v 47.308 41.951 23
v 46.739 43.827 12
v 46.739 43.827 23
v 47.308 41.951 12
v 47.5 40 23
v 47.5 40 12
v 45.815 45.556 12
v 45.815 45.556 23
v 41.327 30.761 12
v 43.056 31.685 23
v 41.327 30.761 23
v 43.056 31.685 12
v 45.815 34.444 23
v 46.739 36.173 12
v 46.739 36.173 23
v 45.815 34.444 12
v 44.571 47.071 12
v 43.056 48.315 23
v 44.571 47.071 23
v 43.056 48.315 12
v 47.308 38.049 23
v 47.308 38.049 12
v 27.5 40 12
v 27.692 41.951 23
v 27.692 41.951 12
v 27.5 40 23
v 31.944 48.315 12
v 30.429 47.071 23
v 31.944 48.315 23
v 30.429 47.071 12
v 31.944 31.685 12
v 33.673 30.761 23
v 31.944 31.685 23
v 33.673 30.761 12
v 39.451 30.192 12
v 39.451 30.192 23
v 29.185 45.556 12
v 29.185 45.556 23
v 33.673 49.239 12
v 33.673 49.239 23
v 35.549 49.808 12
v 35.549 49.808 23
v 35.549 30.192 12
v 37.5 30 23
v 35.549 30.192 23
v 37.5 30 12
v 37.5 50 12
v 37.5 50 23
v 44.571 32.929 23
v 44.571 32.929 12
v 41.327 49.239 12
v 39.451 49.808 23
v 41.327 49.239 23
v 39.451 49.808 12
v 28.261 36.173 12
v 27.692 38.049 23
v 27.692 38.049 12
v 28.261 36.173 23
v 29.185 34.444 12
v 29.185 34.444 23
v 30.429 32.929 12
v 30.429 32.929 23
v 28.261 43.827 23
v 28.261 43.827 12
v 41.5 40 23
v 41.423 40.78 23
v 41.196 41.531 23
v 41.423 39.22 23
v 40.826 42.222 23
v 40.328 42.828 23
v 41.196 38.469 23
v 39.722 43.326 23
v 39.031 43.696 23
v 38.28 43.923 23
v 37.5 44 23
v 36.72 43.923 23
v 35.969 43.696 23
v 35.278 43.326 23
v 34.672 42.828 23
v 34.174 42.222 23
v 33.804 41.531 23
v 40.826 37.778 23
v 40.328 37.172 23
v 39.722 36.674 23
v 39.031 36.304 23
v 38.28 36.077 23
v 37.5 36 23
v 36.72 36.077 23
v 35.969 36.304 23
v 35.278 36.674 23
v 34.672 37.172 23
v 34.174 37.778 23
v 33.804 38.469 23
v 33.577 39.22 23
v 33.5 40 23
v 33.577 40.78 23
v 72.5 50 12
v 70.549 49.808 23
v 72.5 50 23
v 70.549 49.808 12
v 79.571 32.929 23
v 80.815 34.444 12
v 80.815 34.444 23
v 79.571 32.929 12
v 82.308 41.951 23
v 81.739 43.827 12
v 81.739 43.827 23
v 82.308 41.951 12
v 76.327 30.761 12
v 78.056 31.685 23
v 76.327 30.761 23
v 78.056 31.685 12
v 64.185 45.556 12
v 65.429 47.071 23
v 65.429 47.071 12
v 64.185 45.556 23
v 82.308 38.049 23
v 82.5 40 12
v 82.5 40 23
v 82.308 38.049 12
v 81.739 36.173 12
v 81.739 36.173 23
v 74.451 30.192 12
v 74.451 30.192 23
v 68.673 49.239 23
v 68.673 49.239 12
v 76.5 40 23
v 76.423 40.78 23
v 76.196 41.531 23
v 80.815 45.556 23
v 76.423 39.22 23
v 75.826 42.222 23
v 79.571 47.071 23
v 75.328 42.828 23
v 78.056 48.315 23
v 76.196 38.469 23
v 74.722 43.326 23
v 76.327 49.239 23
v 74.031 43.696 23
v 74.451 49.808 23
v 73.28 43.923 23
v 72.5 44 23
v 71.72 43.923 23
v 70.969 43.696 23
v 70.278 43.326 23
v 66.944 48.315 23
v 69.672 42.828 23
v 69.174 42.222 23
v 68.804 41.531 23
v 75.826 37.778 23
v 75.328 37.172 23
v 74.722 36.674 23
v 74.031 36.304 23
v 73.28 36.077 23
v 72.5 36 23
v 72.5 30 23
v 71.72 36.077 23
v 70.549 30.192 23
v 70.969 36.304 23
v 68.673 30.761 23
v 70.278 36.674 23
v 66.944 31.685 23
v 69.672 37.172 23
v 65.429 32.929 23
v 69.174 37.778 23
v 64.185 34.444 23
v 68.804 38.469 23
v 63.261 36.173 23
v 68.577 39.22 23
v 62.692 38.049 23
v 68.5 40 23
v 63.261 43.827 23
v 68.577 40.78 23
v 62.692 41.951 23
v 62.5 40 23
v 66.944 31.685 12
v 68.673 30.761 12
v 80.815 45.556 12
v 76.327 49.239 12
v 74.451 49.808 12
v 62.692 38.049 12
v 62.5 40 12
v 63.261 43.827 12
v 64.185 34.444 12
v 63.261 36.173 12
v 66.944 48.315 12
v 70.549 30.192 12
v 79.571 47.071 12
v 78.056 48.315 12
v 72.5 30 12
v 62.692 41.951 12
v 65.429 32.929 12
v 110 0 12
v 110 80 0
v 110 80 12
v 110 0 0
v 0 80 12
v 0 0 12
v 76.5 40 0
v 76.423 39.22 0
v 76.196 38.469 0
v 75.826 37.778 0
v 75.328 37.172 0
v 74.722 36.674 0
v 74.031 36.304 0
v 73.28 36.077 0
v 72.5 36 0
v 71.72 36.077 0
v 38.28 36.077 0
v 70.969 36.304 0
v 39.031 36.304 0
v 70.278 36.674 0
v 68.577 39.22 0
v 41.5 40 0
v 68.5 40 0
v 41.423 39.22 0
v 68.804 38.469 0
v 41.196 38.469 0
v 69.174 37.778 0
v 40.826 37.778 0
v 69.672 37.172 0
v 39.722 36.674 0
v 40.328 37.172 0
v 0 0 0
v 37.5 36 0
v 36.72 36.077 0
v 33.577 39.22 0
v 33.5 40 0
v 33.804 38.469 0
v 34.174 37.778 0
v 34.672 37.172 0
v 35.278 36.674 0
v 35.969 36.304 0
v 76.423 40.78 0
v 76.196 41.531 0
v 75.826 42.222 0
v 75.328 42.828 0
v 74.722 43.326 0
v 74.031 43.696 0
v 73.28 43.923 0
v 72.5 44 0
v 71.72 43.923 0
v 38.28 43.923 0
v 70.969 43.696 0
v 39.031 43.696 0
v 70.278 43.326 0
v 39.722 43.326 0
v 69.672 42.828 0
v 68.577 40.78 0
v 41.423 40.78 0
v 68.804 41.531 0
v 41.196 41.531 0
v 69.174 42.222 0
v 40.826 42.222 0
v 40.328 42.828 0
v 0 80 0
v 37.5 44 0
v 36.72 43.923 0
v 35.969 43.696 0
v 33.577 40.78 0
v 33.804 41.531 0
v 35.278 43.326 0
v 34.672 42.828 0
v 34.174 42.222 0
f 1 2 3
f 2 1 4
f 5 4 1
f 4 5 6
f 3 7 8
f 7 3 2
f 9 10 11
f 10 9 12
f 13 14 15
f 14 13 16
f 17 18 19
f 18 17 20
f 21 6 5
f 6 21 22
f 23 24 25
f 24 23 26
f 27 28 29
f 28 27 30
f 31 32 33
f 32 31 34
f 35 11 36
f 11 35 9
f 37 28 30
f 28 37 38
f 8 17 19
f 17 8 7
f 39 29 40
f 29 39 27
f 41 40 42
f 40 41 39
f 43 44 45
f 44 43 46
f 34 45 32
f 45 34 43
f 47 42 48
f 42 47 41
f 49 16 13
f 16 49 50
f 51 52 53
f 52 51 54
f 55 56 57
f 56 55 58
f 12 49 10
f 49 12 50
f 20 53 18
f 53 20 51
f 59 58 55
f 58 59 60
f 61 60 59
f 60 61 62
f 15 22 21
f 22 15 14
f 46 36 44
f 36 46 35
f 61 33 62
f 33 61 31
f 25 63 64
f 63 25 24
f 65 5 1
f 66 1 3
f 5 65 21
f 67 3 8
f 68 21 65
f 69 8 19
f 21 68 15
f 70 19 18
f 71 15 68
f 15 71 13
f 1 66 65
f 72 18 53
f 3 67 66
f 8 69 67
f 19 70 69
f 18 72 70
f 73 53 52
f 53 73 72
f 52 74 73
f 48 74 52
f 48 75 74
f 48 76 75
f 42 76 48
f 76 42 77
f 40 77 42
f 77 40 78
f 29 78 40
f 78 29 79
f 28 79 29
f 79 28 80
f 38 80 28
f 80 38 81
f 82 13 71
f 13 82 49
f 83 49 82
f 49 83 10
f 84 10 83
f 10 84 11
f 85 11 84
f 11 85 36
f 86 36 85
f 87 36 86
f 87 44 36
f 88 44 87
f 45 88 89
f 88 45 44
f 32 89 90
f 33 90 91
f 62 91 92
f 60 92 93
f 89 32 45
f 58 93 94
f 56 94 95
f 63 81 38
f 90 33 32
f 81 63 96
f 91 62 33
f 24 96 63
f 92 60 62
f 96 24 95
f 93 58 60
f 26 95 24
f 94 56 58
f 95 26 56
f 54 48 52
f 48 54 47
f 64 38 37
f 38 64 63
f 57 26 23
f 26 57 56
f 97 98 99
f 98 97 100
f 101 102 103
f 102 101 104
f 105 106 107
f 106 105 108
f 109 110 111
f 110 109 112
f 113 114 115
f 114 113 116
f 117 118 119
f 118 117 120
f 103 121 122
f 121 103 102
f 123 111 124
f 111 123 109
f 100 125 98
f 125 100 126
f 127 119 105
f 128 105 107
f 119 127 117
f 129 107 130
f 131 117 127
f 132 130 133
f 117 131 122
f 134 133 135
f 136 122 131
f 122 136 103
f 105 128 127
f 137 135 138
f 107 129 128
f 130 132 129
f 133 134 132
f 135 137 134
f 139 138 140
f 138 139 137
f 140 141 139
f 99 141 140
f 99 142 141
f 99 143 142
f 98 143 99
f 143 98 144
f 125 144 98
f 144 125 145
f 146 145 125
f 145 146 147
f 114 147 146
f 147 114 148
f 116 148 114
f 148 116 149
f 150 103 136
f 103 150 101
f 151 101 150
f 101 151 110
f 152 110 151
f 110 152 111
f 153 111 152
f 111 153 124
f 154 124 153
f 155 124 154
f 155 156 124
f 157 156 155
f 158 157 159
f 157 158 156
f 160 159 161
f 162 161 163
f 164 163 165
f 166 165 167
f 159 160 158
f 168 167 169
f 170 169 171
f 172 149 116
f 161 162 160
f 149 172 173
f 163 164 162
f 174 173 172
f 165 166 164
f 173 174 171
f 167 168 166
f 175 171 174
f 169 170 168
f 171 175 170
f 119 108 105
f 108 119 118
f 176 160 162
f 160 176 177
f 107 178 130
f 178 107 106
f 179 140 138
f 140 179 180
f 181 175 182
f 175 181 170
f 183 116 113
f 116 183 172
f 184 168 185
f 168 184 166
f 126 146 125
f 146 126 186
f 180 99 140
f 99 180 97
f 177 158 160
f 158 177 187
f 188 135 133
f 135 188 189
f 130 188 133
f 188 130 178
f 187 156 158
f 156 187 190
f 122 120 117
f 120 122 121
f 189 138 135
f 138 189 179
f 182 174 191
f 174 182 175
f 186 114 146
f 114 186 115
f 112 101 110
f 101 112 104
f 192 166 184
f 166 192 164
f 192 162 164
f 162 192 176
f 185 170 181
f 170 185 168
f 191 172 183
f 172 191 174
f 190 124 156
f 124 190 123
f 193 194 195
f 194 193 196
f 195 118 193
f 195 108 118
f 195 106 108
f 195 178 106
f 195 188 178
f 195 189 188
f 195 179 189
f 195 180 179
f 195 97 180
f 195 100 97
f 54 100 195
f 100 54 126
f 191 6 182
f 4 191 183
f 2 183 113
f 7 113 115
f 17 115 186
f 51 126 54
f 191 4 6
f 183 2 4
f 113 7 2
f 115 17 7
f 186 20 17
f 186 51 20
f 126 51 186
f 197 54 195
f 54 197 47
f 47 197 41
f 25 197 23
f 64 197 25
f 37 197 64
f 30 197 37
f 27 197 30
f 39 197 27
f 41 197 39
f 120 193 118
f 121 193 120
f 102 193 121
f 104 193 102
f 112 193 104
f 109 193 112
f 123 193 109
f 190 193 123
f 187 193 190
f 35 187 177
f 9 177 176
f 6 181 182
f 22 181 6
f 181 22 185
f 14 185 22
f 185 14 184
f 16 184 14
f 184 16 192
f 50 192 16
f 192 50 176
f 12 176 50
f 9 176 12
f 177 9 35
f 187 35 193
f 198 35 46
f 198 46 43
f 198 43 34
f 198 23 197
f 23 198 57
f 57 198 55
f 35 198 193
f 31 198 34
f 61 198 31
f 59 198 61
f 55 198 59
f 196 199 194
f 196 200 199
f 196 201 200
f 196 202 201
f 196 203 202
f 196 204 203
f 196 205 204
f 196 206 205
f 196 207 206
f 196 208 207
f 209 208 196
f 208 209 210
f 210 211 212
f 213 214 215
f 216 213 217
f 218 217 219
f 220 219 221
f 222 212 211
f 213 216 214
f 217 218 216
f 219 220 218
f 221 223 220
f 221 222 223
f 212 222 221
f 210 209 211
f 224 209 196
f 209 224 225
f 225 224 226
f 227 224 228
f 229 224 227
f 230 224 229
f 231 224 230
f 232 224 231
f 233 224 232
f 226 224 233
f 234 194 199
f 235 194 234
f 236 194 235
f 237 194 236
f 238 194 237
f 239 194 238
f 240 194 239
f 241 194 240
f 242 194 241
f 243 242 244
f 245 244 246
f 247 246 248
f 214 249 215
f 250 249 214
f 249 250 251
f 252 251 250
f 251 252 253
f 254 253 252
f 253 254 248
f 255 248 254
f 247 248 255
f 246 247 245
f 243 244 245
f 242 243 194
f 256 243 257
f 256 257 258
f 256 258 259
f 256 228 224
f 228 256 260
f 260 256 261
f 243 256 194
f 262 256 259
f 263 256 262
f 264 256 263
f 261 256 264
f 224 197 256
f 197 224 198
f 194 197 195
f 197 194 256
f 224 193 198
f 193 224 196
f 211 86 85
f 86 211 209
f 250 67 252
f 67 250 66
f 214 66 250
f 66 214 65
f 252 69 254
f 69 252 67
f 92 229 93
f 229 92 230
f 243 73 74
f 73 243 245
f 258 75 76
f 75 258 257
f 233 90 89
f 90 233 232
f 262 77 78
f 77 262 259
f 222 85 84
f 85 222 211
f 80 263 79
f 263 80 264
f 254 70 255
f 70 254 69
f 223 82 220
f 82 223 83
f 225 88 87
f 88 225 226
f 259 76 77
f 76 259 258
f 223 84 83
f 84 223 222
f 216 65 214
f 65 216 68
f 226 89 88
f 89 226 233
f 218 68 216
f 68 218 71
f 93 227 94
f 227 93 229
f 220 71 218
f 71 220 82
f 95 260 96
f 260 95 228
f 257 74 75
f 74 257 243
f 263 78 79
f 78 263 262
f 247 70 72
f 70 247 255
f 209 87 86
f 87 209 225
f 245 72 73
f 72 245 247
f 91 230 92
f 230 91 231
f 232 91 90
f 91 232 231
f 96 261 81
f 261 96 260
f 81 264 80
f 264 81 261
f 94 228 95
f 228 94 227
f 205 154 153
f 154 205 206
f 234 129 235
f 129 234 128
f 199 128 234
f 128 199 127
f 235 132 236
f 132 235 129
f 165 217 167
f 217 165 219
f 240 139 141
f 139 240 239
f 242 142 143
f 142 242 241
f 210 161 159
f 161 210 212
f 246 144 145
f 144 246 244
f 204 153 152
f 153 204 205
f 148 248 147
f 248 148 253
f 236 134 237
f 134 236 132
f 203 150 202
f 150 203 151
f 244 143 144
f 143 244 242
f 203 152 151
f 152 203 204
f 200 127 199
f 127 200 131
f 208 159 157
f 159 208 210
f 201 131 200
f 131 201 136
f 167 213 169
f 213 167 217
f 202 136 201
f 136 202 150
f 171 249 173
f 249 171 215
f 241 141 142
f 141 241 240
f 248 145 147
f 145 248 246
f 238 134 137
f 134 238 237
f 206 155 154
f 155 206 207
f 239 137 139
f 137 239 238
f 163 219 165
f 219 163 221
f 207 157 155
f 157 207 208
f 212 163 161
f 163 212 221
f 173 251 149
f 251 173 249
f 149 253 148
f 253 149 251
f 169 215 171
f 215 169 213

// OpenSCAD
$fn = 32;

// ----------------------------------------------------------------------
// Drill jig: two_boss jig
// ----------------------------------------------------------------------

// --- parameters (mm) ---
plate_l = 110;            // plate length, X
plate_w = 80;             // plate width, Y
plate_t = 12;             // plate thickness
boss_d = 20;              // guide boss diameter
boss_h = 12;              // boss height above the plate
guide_d = 8;              // guide hole diameter
boss_pitch = 35;          // boss pitch

n_boss = 2;  // guide bosses
boss_x0 = (plate_l - (n_boss - 1) * boss_pitch) / 2;  // first boss X
boss_top = plate_t - 1 + boss_h;  // boss crown height
total_h = boss_top;  // overall height

difference() {
  union() {
  cube([plate_l, plate_w, plate_t]);
  for (i = [0 : n_boss - 1])
    translate([boss_x0 + i * boss_pitch, plate_w / 2, plate_t - 1])
      cylinder(h = boss_h, d = boss_d);
  }
  for (i = [0 : n_boss - 1])
    translate([boss_x0 + i * boss_pitch, plate_w / 2, -1])
      cylinder(h = plate_t + boss_h, d = guide_d);
}
